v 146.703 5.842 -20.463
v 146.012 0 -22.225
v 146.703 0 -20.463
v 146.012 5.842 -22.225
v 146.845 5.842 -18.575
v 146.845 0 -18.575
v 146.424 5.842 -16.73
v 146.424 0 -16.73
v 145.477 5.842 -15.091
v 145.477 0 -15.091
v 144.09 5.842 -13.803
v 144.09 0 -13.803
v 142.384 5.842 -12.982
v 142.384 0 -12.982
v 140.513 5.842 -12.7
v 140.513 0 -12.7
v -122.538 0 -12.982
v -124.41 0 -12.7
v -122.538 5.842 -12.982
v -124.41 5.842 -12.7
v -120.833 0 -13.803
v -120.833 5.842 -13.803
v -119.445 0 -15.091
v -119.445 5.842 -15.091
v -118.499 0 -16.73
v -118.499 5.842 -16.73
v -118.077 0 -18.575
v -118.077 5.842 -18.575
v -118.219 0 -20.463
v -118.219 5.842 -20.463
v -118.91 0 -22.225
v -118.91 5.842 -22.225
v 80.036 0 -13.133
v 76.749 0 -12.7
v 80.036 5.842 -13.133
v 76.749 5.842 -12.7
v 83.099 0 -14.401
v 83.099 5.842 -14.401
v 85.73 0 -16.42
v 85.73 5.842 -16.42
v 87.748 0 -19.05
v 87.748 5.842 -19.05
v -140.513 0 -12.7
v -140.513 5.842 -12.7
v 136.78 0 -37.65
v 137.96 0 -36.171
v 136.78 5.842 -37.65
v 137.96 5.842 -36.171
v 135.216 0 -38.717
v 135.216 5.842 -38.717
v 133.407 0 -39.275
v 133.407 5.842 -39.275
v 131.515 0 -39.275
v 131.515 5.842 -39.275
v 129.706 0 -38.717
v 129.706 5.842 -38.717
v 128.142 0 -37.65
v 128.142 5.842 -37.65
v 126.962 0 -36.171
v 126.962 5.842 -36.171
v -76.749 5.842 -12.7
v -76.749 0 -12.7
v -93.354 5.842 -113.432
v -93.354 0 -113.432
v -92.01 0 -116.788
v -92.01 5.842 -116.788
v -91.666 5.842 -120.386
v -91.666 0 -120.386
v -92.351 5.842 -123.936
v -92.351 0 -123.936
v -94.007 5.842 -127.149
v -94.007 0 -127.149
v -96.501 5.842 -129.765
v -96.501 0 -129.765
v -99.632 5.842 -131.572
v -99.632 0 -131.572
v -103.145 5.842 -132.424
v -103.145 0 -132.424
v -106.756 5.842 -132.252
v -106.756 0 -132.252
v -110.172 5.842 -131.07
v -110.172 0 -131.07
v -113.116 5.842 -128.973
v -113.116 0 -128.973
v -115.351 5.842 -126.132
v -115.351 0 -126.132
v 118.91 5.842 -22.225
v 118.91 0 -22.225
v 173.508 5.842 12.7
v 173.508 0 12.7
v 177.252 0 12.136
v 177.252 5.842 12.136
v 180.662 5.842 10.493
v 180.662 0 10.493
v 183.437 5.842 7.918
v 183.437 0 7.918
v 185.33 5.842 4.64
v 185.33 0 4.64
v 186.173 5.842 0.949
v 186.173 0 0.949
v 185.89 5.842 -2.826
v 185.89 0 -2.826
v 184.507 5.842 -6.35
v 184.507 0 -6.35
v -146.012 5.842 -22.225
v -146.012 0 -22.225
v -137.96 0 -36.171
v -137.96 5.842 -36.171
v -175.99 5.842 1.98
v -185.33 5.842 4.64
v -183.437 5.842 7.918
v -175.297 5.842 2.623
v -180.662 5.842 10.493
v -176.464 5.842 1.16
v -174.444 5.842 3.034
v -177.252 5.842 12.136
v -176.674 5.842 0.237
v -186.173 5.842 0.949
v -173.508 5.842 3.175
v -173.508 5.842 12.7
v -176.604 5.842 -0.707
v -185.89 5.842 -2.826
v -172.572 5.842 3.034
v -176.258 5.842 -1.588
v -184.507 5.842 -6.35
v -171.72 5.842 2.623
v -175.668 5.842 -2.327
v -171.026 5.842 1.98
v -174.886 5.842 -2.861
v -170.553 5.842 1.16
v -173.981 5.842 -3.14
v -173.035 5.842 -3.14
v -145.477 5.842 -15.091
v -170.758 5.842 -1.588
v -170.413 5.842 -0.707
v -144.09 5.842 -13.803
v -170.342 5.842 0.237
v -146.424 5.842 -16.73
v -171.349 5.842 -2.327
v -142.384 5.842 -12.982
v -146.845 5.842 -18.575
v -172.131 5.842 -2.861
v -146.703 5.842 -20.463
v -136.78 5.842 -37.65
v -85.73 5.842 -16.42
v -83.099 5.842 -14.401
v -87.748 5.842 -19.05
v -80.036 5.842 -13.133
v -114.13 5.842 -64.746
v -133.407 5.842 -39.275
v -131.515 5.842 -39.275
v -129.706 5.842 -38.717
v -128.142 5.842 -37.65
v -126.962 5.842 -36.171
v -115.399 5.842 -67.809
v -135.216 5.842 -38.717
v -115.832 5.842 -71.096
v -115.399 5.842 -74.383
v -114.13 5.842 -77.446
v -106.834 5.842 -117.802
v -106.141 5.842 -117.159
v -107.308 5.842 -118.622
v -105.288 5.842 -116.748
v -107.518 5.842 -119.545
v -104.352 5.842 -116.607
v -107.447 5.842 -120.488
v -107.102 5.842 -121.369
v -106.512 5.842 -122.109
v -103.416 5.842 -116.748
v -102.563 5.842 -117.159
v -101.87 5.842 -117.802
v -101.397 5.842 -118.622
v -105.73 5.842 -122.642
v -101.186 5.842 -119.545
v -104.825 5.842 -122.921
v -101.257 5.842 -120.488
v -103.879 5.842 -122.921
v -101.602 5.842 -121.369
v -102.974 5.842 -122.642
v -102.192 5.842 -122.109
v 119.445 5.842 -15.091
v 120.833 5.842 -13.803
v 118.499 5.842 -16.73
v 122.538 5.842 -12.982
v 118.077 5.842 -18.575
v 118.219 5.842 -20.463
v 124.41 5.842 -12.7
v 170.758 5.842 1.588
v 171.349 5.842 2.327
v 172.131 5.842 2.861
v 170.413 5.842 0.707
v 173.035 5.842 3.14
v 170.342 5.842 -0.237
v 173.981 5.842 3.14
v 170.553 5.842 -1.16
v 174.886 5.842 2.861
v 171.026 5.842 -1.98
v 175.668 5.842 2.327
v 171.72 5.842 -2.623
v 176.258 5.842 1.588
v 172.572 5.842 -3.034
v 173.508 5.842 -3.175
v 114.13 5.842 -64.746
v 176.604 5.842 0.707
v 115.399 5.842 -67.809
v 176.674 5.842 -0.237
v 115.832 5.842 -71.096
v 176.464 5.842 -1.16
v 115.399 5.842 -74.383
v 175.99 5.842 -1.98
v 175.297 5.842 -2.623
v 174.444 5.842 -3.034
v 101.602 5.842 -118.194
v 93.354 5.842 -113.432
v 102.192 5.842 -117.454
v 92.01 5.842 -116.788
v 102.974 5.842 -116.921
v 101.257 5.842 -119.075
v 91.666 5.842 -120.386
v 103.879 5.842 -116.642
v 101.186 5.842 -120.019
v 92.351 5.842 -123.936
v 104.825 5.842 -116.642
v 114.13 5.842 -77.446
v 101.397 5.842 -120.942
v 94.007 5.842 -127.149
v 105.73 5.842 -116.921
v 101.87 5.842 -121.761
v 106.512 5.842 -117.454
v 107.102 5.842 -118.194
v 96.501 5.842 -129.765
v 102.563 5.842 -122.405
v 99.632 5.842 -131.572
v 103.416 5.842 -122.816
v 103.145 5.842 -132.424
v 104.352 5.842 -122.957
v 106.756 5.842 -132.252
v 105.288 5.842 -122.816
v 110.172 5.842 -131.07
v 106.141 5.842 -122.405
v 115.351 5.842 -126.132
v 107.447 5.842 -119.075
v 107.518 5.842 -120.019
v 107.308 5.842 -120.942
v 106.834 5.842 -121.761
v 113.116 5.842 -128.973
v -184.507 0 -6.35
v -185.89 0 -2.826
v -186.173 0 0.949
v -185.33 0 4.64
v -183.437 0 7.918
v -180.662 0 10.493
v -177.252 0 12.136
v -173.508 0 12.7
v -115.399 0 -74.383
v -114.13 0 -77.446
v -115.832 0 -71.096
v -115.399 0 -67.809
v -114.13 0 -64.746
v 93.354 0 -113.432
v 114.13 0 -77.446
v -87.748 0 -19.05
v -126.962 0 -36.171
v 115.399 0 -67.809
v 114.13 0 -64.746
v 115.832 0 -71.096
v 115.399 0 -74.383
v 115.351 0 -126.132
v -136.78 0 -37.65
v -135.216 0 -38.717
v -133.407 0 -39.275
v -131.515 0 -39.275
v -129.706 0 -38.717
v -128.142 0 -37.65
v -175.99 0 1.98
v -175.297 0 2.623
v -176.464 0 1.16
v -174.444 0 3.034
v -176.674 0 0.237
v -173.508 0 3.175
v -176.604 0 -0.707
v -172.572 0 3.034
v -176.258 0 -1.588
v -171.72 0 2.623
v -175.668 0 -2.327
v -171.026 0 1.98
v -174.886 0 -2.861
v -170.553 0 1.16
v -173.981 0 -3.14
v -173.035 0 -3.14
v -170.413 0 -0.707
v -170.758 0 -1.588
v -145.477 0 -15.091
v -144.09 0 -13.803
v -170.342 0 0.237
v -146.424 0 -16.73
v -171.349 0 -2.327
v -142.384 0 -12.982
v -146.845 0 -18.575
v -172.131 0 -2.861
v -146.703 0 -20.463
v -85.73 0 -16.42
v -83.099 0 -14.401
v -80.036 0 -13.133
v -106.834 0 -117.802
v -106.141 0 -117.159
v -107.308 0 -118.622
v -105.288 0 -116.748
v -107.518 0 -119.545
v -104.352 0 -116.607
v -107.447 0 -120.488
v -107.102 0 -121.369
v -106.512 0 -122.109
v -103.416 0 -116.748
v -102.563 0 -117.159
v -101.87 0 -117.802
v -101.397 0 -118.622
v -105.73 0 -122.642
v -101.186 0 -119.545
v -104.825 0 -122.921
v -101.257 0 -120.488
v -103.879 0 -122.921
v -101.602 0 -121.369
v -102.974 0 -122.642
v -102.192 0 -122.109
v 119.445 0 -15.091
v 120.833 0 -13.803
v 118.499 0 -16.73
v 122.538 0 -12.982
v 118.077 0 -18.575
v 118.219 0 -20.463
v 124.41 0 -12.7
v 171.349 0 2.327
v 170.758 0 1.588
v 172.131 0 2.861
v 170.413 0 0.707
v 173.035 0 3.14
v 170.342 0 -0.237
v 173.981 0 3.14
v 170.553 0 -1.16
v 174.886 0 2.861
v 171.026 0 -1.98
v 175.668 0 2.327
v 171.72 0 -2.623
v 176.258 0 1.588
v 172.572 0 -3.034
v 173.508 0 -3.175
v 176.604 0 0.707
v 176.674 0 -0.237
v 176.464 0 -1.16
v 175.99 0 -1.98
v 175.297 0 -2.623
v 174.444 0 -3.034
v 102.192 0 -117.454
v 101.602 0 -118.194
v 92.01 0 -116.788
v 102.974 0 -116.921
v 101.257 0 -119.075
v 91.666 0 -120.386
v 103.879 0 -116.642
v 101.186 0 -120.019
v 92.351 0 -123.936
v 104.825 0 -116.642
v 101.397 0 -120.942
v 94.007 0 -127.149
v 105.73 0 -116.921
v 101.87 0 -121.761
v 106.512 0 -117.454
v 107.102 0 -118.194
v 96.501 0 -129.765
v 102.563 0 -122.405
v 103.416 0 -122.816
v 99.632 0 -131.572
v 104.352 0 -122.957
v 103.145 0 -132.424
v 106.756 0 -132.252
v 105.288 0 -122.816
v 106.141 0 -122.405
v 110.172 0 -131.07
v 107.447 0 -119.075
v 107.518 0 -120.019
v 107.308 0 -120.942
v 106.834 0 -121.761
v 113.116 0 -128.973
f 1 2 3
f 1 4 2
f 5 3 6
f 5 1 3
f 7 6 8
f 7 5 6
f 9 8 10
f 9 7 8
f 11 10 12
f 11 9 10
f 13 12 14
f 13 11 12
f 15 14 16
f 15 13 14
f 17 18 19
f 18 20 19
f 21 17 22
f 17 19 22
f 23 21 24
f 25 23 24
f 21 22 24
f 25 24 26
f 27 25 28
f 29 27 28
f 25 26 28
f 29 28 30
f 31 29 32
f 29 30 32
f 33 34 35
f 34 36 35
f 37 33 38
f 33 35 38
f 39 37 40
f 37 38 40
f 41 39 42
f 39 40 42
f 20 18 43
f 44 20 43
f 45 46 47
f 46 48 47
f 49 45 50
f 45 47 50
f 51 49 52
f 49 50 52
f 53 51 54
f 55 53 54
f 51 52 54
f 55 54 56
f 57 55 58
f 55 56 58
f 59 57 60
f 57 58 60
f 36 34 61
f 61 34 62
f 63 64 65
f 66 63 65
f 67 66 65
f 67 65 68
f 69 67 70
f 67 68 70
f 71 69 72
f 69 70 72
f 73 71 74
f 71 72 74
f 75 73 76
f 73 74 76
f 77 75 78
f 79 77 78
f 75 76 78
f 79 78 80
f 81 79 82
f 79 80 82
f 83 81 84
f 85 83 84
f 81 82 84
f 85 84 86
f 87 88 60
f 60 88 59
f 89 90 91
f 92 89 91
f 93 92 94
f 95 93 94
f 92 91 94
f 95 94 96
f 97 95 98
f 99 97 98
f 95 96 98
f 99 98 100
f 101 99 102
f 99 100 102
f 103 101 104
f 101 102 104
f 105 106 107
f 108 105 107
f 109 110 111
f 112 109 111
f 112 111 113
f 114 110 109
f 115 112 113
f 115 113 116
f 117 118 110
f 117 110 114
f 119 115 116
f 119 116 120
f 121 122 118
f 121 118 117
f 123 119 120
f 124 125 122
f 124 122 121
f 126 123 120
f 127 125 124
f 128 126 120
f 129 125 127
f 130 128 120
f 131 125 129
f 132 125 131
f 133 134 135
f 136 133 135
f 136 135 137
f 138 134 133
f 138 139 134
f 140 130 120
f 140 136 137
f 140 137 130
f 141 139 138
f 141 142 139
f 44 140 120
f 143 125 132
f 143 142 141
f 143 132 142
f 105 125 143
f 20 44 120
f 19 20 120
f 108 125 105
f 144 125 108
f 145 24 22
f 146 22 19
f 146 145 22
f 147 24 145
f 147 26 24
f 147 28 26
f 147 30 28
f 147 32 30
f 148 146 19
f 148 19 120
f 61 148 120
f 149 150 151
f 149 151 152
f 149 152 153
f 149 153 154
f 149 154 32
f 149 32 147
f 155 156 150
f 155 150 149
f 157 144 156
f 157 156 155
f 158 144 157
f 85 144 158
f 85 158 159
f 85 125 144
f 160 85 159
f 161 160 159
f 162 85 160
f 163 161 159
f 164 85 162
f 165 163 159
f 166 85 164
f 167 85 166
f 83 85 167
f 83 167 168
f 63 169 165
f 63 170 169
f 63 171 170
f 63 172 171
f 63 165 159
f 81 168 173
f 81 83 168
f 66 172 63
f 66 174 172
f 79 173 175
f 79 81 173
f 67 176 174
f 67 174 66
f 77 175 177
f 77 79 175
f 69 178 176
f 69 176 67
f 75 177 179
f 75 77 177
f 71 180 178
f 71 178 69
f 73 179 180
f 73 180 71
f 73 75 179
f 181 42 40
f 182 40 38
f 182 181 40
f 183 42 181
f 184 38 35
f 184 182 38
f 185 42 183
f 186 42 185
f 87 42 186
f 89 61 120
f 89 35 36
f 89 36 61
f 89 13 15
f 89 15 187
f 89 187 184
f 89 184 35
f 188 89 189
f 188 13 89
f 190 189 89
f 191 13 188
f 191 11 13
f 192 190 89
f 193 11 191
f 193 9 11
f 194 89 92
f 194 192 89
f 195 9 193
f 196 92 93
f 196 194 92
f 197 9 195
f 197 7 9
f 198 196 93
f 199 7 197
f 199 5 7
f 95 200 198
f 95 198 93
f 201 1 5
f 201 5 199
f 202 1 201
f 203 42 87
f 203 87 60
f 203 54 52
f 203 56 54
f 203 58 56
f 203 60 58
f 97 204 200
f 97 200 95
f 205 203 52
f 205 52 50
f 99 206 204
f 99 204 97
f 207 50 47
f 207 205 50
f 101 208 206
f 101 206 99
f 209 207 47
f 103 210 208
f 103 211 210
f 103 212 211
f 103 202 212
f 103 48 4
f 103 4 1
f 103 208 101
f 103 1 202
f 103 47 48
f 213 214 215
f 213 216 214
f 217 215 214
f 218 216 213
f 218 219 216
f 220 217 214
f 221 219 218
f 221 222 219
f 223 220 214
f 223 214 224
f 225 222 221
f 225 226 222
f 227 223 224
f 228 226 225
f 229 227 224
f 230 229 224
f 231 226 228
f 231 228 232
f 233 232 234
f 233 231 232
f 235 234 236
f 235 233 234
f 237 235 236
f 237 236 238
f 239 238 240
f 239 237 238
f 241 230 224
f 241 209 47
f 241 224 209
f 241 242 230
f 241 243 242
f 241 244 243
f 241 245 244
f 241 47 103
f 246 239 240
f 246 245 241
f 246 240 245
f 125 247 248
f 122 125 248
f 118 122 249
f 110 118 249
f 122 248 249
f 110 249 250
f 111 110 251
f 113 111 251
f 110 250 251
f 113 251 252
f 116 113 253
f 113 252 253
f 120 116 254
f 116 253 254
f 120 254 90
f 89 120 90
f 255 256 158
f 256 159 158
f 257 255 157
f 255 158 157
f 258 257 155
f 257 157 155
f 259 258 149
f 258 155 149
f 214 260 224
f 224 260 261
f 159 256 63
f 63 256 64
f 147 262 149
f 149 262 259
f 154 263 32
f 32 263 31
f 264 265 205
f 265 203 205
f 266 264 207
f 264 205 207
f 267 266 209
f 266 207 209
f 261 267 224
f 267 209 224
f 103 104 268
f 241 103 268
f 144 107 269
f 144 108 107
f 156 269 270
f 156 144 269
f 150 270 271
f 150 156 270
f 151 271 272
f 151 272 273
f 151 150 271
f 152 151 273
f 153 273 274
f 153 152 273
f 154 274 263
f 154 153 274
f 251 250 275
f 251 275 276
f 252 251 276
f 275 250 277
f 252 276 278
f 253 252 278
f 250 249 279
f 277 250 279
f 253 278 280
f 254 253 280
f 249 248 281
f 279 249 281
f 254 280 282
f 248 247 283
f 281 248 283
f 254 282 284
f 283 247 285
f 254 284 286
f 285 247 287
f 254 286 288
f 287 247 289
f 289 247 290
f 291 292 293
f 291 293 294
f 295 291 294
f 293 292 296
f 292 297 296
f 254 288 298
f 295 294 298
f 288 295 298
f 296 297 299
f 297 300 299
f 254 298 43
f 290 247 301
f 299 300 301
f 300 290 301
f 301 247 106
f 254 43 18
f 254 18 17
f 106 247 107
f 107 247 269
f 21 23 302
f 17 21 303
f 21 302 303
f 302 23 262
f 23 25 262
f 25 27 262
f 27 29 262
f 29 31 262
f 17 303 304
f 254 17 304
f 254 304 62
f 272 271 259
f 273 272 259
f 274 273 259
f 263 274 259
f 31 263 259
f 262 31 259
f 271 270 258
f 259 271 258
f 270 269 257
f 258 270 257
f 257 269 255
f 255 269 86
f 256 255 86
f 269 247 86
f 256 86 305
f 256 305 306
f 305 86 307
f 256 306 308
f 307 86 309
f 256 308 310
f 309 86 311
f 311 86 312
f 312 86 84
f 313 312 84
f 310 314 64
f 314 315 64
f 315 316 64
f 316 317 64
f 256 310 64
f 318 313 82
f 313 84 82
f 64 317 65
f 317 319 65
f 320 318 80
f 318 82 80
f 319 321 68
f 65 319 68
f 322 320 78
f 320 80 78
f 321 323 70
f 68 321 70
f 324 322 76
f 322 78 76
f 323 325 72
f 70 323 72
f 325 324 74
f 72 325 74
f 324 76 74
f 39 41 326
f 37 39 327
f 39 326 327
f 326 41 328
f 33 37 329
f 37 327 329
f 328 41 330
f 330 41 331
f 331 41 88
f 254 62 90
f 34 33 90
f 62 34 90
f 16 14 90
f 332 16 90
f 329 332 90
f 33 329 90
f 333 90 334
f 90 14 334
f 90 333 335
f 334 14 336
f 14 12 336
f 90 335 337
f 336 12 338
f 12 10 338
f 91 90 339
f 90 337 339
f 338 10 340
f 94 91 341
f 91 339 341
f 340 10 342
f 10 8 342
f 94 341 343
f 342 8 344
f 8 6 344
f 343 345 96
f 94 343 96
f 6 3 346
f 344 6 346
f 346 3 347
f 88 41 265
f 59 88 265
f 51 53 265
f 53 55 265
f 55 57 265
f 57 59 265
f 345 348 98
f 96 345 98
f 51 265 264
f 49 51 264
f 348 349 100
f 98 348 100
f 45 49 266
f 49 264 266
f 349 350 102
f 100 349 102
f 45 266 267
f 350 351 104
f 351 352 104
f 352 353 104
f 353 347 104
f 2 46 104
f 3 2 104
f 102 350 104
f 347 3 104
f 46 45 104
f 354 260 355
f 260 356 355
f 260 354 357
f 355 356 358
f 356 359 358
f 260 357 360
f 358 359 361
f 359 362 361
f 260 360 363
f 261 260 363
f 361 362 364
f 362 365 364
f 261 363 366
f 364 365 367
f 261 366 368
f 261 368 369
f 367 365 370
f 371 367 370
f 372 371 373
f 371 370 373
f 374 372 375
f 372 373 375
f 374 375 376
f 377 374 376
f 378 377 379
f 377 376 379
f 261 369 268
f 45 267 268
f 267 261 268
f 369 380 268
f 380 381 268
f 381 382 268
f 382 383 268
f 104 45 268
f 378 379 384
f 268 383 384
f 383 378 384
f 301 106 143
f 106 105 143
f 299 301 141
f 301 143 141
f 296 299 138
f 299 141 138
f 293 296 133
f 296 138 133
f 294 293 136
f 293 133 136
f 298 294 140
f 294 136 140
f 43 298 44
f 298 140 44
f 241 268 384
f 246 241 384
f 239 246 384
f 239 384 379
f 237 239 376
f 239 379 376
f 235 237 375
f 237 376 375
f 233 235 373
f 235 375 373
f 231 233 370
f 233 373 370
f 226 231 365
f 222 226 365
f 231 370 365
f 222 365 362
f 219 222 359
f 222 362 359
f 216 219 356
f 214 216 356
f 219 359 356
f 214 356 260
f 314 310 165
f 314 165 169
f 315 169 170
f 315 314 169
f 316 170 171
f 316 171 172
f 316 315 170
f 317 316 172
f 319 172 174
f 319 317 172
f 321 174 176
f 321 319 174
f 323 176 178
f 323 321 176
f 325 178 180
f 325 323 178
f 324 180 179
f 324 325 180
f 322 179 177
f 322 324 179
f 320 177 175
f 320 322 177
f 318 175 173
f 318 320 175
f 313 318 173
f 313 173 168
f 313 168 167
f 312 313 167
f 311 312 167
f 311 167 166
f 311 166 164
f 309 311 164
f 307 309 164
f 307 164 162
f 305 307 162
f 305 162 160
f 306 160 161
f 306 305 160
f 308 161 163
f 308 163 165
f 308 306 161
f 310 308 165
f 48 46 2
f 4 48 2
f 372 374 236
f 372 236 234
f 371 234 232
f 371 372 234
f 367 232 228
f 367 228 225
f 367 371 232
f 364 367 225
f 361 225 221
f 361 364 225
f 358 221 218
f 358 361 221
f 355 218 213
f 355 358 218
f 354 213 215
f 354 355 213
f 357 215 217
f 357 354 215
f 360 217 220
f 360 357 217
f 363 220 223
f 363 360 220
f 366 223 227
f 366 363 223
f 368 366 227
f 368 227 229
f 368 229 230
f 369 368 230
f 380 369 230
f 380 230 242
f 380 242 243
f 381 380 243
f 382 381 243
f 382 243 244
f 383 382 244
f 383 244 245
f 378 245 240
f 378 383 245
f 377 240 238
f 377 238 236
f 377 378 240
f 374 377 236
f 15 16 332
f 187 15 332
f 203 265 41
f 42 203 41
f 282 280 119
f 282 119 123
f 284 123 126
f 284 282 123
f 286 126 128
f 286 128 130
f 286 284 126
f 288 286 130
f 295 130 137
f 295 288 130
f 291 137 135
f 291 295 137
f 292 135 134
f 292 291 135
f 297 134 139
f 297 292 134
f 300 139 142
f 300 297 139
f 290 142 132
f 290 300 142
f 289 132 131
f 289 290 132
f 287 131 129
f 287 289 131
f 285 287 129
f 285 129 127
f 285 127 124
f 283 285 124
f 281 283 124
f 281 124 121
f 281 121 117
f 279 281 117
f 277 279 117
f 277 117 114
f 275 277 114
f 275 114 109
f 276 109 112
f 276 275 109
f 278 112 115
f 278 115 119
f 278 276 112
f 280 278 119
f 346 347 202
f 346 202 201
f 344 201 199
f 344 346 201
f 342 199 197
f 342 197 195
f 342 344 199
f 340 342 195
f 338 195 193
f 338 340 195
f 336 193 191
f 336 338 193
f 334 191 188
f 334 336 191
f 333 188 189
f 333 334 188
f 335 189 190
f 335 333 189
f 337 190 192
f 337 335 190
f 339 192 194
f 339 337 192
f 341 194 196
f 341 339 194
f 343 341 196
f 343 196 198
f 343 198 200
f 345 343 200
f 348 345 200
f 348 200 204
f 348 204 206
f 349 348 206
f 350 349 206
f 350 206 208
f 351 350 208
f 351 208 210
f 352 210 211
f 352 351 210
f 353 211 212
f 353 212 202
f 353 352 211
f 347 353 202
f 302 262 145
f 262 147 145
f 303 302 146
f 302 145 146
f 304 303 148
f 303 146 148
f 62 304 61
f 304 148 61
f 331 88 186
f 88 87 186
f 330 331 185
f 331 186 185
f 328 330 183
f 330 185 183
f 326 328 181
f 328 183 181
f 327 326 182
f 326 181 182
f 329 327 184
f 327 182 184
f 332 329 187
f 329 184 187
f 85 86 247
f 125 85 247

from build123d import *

# Parameters (mm, degrees)
SKETCH1_R           = 3.175
BOSS_EXTRUDE1_DEPTH = 5.842
FILLET1_R           = 6.35
FILLET2_R           = 12.7


with BuildPart() as part:
    # Sketch1 → Boss-Extrude1 (new body)
    with BuildSketch(Plane(origin=(0, 0, 0), x_dir=(1, 0, 0), z_dir=(0, 1, 0))):
        with BuildLine():
            Line((-115.350561828, 126.131830356), (-184.506633828, 6.35))
            ThreePointArc((-184.506633828, 6.35), (-184.506633828, -6.35), (-173.5081112, -12.7))
            Line((-173.5081112, -12.7), (173.5081112, -12.7))
            ThreePointArc((173.5081112, -12.7), (184.506633828, -6.35), (184.506633828, 6.35))
            Line((184.506633828, 6.35), (115.350561828, 126.131830356))
            ThreePointArc((115.350561828, 126.131830356), (98.0020392, 130.780352984), (93.353516572, 113.431830356))
            Line((93.353516572, 113.431830356), (117.796369106, 71.095567884))
            Line((117.796369106, 71.095567884), (84.081672269, 12.7))
            Line((84.081672269, 12.7), (-84.081672269, 12.7))
            Line((-84.081672269, 12.7), (-117.796369106, 71.095567884))
            Line((-117.796369106, 71.095567884), (-93.353516572, 113.431830356))
            ThreePointArc((-93.353516572, 113.431830356), (-98.0020392, 130.780352984), (-115.350561828, 126.131830356))
        make_face()
        with Locations(Location((-173.5081112, 0, 0), (0, 0, 270))):
            Circle(SKETCH1_R, mode=Mode.SUBTRACT)
        with Locations(Location((-104.3520392, 119.781830356, 0), (0, 0, 270))):
            Circle(SKETCH1_R, mode=Mode.SUBTRACT)
        with Locations(Location((104.3520392, 119.781830356, 0), (0, 0, 90))):
            Circle(SKETCH1_R, mode=Mode.SUBTRACT)
        with Locations(Location((173.5081112, 0, 0), (0, 0, 90))):
            Circle(SKETCH1_R, mode=Mode.SUBTRACT)
        Polygon((151.511065944, 12.7), (113.411065944, 12.7), (132.461065944, 45.695567884), align=None, mode=Mode.SUBTRACT)
        Polygon((-132.461065944, 45.695567884), (-113.411065944, 12.7), (-151.511065944, 12.7), align=None, mode=Mode.SUBTRACT)
    extrude(amount=BOSS_EXTRUDE1_DEPTH)

    # Fillet1
    fillet1_edges = [part.edges().sort_by_distance(p)[0] for p in [
        (151.511065944, 2.921, -12.7),
        (132.461065944, 2.921, -45.695567884),
        (113.411065944, 2.921, -12.7),
        (-132.461065944, 2.921, -45.695567884),
        (-151.511065944, 2.921, -12.7),
        (-113.411065944, 2.921, -12.7),
    ]]
    fillet(fillet1_edges, radius=FILLET1_R)

    # Fillet2
    fillet2_edges = [part.edges().sort_by_distance(p)[0] for p in [
        (-117.796369106, 2.921, -71.095567884),
        (-84.081672269, 2.921, -12.7),
        (84.081672269, 2.921, -12.7),
        (117.796369106, 2.921, -71.095567884),
    ]]
    fillet(fillet2_edges, radius=FILLET2_R)


solid = part.part
